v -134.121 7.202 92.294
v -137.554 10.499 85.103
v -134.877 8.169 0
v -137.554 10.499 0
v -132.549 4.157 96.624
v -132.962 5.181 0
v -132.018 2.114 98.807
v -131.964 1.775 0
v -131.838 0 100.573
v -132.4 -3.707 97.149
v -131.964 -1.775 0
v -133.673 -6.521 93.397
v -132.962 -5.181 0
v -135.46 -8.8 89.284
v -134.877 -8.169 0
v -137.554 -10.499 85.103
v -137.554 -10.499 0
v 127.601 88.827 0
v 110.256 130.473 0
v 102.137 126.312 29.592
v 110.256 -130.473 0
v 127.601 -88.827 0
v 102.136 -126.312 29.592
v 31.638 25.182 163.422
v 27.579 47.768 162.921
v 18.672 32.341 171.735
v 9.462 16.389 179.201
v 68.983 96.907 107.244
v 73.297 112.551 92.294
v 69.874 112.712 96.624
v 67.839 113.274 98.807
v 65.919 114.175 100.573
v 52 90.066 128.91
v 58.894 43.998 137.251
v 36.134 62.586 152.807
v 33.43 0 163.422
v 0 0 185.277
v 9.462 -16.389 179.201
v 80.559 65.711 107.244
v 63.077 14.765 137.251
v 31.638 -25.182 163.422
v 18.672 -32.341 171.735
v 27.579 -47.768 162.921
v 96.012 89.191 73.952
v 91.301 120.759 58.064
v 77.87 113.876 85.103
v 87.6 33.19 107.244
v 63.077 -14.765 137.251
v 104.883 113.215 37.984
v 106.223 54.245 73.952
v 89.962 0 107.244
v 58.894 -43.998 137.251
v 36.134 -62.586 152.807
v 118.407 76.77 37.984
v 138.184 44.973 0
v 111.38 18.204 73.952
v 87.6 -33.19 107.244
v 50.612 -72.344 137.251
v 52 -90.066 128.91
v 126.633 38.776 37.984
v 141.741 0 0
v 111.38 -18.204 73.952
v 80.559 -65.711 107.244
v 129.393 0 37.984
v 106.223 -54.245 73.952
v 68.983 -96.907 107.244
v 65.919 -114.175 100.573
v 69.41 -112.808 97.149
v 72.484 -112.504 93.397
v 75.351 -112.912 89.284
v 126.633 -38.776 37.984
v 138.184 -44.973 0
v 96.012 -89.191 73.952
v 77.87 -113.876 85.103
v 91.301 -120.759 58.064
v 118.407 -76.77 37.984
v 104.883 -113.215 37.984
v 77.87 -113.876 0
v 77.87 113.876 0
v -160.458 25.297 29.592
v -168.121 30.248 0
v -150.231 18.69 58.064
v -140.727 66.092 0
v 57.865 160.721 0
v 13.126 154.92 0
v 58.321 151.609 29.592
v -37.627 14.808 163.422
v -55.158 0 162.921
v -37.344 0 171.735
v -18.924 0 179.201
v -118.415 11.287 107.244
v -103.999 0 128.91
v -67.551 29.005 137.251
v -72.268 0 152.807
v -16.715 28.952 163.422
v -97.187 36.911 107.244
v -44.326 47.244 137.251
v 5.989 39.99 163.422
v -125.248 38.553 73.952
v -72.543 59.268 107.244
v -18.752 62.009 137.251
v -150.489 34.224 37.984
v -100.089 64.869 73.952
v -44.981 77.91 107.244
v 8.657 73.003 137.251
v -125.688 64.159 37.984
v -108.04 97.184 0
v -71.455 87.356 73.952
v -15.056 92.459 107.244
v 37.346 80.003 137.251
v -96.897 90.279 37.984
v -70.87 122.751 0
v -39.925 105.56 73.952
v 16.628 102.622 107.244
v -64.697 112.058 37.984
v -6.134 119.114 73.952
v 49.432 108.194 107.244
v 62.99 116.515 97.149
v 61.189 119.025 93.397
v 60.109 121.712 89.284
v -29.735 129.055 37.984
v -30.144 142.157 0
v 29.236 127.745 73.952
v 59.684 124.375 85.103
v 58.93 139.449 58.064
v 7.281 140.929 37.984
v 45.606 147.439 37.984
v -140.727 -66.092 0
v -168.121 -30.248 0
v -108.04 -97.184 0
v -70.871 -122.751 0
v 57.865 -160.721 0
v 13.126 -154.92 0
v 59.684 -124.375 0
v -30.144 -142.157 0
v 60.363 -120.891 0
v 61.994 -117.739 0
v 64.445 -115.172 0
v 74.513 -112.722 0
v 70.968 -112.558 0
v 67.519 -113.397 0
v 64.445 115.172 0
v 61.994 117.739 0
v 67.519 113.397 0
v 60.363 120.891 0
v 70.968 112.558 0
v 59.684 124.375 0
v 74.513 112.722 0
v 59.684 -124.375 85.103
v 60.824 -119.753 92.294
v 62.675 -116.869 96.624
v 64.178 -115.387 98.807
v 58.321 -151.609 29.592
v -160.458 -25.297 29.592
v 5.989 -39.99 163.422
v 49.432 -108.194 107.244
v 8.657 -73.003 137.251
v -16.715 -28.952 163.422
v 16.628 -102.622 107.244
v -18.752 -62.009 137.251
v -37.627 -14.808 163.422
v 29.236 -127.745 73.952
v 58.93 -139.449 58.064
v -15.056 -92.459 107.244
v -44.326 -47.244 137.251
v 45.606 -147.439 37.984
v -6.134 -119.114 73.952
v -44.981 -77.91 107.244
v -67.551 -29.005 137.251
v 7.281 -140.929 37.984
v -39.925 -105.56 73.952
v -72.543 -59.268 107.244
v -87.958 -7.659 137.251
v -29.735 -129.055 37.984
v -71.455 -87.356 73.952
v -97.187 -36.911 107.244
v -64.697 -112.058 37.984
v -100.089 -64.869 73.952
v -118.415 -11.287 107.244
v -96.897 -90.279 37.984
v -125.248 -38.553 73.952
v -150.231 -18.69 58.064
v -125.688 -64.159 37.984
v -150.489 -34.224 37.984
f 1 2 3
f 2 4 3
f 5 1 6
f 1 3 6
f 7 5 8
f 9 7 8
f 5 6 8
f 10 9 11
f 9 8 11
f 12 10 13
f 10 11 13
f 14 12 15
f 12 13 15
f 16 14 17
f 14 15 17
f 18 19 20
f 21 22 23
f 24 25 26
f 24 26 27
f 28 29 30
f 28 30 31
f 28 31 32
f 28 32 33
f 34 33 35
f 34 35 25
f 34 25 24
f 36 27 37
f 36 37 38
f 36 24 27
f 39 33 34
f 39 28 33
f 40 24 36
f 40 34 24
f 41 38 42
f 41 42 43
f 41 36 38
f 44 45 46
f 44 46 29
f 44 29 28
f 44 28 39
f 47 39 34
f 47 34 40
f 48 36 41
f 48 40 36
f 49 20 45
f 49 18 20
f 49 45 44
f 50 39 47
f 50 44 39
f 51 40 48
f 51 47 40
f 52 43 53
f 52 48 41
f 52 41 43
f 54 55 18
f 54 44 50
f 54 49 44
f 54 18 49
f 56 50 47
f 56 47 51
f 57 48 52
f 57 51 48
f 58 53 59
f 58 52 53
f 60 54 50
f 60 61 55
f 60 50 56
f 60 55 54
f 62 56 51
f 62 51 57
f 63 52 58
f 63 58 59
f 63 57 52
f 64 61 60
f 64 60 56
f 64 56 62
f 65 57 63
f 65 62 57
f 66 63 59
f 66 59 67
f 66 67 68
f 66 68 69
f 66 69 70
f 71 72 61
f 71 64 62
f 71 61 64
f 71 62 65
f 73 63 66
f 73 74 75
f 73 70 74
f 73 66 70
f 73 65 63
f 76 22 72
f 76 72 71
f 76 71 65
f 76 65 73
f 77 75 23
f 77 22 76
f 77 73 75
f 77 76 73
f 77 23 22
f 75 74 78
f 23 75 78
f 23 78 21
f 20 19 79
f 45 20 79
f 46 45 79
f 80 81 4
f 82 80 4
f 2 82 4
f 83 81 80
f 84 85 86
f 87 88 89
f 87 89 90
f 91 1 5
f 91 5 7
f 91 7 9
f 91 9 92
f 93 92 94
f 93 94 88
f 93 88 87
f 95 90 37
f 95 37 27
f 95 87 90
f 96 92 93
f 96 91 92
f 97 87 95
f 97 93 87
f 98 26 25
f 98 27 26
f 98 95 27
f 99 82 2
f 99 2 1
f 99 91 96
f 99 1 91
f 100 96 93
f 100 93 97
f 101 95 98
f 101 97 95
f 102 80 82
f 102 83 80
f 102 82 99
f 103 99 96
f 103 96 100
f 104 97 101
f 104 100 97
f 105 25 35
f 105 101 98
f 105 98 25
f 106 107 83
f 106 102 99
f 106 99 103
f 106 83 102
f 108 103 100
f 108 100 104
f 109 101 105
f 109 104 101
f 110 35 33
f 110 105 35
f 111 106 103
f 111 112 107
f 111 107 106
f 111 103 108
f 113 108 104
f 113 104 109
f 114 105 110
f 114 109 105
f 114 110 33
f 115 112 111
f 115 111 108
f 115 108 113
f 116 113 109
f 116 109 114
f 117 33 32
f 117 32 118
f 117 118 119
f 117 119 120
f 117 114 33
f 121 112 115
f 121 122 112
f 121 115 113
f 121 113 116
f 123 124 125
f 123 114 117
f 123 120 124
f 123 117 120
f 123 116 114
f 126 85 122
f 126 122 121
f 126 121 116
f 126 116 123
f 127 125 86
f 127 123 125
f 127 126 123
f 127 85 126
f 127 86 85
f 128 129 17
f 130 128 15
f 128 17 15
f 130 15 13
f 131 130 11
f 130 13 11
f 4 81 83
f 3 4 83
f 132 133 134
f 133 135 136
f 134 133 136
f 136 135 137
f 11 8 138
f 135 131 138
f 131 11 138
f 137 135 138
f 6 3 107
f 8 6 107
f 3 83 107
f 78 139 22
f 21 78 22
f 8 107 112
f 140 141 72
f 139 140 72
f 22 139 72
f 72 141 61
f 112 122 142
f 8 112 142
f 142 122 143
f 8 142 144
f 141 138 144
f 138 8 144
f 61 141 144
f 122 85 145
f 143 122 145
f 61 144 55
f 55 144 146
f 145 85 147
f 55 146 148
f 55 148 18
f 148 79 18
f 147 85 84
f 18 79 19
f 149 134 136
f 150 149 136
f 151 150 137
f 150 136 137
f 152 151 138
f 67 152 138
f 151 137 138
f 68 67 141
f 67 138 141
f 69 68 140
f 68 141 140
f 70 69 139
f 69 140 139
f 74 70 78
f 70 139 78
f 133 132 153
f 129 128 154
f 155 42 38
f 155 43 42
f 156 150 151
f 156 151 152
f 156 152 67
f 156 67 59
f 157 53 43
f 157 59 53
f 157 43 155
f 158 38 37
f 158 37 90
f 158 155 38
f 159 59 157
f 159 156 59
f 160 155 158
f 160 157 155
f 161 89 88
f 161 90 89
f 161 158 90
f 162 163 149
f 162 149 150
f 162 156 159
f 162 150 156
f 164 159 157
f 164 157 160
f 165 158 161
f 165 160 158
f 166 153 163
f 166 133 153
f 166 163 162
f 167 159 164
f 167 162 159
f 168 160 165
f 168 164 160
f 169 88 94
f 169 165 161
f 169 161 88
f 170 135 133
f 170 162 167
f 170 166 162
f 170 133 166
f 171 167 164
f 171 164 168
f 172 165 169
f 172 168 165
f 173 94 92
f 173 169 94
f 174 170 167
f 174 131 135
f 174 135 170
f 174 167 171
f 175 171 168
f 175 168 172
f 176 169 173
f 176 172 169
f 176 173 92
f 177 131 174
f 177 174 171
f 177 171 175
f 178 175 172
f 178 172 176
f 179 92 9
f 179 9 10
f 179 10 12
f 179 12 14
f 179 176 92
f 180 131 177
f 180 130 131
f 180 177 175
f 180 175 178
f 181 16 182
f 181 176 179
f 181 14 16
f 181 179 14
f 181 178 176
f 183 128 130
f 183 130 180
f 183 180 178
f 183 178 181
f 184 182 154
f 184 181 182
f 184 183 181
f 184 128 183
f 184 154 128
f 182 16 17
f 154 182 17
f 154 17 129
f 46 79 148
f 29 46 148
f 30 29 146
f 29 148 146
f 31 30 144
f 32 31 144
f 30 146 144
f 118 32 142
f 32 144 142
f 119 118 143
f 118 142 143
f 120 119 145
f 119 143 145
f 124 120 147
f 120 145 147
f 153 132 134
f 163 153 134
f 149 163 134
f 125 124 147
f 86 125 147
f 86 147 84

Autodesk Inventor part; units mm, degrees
ref_plane "YZ Plane" through (0, 0, 0) normal (1, 0, 0) x (0, 1, 0)
ref_plane "XZ Plane" through (0, 0, 0) normal (0, 1, 0) x (-1, 0, 0)
ref_plane "XY Plane" through (0, 0, 0) normal (0, 0, 1) x (1, 0, 0)
sketch "Sketch1" plane through (0, 0, 0) normal (0, 0, 1) x (1, 0, 0)
  circle A0 centre (0, 0) radius 500
  dimension "d0" = 1000
extrude "Extrusion1" add sketch "Sketch1" along normal blind 1000
sketch "Sketch2" plane through (0, 0, 0) normal (0, 1, 0) x (-1, 0, 0)
  line L0 (144.3376, 0) -> (-72.1688, -125)
  line L1 (-72.1688, -125) -> (-72.1688, 125)
  line L2 (-72.1688, 125) -> (144.3376, 0)
  line L3 (144.3376, 0) -> (144.3376, -72)
  arc A0 (144.3376, 223) -> (144.3376, -367) centre (144.3376, -72) ccw
  line L4 (144.3376, 0) -> (144.3376, 223)
  line L5 (144.3376, -72) -> (144.3376, -367)
  line L6 (144.3376, -367) -> (144.3376, 223)
  line L7 (144.3376, -367) -> (-768.1743, -367)
  line L8 (-768.1743, -367) -> (-768.1743, 1365.1918)
  line L9 (-768.1743, 1365.1918) -> (144.3376, 1365.1918)
  line L10 (144.3376, 1365.1918) -> (144.3376, 223)
  point P0 (0, 0)
  point P1 (0, 0)
  dimension "d4" = 250
  dimension "d5" = 72
  dimension "d6" = 590
  dimension "d7" = 1732.1918
  dimension "d8" = 912.5119
revolve "Revolution1" cut sketch "Sketch2" angle 360 about axis through (-144.3376, 0, 1365.1918) along (0, 0, -1) contours A0 L7 L8 L9 L10
pattern_circular "Circular Pattern1" count 3 over 360 about axis through (0, 0, -10) along (0, 0, 1) of "Revolution1"
sketch "Sketch3" plane through (0, 0, 0) normal (0, 0, -1) x (-1, 0, 0)
  arc A0 (-92.578, -160.3497) -> (185.1559, 0) centre (-72.1688, 125) ccw projected
  arc A1 (185.1559, 0) -> (-92.578, 160.3497) centre (-72.1688, -125) ccw projected
  arc A2 (-92.578, 160.3497) -> (-92.578, -160.3497) centre (144.3376, 0) ccw projected
  circle A3 centre (-72.1688, 125) radius 12.5
  line L0 (-110.2559, 130.4728) -> (-77.8697, 113.8757)
  line L1 (-59.6844, 124.375) -> (-57.8649, 160.7208)
  point P0 (0, 0)
  dimension "d13" = 25
extrude "Extrusion2" cut sketch "Sketch3" against normal blind 1000 contours A2 A1 L1 A3 L0 | A3
pattern_circular "Circular Pattern2" count 3 over 360 about axis through (0, 0, -10) along (0, 0, 1) of "Extrusion2"
properties part number "WORK ENVELOPE"
